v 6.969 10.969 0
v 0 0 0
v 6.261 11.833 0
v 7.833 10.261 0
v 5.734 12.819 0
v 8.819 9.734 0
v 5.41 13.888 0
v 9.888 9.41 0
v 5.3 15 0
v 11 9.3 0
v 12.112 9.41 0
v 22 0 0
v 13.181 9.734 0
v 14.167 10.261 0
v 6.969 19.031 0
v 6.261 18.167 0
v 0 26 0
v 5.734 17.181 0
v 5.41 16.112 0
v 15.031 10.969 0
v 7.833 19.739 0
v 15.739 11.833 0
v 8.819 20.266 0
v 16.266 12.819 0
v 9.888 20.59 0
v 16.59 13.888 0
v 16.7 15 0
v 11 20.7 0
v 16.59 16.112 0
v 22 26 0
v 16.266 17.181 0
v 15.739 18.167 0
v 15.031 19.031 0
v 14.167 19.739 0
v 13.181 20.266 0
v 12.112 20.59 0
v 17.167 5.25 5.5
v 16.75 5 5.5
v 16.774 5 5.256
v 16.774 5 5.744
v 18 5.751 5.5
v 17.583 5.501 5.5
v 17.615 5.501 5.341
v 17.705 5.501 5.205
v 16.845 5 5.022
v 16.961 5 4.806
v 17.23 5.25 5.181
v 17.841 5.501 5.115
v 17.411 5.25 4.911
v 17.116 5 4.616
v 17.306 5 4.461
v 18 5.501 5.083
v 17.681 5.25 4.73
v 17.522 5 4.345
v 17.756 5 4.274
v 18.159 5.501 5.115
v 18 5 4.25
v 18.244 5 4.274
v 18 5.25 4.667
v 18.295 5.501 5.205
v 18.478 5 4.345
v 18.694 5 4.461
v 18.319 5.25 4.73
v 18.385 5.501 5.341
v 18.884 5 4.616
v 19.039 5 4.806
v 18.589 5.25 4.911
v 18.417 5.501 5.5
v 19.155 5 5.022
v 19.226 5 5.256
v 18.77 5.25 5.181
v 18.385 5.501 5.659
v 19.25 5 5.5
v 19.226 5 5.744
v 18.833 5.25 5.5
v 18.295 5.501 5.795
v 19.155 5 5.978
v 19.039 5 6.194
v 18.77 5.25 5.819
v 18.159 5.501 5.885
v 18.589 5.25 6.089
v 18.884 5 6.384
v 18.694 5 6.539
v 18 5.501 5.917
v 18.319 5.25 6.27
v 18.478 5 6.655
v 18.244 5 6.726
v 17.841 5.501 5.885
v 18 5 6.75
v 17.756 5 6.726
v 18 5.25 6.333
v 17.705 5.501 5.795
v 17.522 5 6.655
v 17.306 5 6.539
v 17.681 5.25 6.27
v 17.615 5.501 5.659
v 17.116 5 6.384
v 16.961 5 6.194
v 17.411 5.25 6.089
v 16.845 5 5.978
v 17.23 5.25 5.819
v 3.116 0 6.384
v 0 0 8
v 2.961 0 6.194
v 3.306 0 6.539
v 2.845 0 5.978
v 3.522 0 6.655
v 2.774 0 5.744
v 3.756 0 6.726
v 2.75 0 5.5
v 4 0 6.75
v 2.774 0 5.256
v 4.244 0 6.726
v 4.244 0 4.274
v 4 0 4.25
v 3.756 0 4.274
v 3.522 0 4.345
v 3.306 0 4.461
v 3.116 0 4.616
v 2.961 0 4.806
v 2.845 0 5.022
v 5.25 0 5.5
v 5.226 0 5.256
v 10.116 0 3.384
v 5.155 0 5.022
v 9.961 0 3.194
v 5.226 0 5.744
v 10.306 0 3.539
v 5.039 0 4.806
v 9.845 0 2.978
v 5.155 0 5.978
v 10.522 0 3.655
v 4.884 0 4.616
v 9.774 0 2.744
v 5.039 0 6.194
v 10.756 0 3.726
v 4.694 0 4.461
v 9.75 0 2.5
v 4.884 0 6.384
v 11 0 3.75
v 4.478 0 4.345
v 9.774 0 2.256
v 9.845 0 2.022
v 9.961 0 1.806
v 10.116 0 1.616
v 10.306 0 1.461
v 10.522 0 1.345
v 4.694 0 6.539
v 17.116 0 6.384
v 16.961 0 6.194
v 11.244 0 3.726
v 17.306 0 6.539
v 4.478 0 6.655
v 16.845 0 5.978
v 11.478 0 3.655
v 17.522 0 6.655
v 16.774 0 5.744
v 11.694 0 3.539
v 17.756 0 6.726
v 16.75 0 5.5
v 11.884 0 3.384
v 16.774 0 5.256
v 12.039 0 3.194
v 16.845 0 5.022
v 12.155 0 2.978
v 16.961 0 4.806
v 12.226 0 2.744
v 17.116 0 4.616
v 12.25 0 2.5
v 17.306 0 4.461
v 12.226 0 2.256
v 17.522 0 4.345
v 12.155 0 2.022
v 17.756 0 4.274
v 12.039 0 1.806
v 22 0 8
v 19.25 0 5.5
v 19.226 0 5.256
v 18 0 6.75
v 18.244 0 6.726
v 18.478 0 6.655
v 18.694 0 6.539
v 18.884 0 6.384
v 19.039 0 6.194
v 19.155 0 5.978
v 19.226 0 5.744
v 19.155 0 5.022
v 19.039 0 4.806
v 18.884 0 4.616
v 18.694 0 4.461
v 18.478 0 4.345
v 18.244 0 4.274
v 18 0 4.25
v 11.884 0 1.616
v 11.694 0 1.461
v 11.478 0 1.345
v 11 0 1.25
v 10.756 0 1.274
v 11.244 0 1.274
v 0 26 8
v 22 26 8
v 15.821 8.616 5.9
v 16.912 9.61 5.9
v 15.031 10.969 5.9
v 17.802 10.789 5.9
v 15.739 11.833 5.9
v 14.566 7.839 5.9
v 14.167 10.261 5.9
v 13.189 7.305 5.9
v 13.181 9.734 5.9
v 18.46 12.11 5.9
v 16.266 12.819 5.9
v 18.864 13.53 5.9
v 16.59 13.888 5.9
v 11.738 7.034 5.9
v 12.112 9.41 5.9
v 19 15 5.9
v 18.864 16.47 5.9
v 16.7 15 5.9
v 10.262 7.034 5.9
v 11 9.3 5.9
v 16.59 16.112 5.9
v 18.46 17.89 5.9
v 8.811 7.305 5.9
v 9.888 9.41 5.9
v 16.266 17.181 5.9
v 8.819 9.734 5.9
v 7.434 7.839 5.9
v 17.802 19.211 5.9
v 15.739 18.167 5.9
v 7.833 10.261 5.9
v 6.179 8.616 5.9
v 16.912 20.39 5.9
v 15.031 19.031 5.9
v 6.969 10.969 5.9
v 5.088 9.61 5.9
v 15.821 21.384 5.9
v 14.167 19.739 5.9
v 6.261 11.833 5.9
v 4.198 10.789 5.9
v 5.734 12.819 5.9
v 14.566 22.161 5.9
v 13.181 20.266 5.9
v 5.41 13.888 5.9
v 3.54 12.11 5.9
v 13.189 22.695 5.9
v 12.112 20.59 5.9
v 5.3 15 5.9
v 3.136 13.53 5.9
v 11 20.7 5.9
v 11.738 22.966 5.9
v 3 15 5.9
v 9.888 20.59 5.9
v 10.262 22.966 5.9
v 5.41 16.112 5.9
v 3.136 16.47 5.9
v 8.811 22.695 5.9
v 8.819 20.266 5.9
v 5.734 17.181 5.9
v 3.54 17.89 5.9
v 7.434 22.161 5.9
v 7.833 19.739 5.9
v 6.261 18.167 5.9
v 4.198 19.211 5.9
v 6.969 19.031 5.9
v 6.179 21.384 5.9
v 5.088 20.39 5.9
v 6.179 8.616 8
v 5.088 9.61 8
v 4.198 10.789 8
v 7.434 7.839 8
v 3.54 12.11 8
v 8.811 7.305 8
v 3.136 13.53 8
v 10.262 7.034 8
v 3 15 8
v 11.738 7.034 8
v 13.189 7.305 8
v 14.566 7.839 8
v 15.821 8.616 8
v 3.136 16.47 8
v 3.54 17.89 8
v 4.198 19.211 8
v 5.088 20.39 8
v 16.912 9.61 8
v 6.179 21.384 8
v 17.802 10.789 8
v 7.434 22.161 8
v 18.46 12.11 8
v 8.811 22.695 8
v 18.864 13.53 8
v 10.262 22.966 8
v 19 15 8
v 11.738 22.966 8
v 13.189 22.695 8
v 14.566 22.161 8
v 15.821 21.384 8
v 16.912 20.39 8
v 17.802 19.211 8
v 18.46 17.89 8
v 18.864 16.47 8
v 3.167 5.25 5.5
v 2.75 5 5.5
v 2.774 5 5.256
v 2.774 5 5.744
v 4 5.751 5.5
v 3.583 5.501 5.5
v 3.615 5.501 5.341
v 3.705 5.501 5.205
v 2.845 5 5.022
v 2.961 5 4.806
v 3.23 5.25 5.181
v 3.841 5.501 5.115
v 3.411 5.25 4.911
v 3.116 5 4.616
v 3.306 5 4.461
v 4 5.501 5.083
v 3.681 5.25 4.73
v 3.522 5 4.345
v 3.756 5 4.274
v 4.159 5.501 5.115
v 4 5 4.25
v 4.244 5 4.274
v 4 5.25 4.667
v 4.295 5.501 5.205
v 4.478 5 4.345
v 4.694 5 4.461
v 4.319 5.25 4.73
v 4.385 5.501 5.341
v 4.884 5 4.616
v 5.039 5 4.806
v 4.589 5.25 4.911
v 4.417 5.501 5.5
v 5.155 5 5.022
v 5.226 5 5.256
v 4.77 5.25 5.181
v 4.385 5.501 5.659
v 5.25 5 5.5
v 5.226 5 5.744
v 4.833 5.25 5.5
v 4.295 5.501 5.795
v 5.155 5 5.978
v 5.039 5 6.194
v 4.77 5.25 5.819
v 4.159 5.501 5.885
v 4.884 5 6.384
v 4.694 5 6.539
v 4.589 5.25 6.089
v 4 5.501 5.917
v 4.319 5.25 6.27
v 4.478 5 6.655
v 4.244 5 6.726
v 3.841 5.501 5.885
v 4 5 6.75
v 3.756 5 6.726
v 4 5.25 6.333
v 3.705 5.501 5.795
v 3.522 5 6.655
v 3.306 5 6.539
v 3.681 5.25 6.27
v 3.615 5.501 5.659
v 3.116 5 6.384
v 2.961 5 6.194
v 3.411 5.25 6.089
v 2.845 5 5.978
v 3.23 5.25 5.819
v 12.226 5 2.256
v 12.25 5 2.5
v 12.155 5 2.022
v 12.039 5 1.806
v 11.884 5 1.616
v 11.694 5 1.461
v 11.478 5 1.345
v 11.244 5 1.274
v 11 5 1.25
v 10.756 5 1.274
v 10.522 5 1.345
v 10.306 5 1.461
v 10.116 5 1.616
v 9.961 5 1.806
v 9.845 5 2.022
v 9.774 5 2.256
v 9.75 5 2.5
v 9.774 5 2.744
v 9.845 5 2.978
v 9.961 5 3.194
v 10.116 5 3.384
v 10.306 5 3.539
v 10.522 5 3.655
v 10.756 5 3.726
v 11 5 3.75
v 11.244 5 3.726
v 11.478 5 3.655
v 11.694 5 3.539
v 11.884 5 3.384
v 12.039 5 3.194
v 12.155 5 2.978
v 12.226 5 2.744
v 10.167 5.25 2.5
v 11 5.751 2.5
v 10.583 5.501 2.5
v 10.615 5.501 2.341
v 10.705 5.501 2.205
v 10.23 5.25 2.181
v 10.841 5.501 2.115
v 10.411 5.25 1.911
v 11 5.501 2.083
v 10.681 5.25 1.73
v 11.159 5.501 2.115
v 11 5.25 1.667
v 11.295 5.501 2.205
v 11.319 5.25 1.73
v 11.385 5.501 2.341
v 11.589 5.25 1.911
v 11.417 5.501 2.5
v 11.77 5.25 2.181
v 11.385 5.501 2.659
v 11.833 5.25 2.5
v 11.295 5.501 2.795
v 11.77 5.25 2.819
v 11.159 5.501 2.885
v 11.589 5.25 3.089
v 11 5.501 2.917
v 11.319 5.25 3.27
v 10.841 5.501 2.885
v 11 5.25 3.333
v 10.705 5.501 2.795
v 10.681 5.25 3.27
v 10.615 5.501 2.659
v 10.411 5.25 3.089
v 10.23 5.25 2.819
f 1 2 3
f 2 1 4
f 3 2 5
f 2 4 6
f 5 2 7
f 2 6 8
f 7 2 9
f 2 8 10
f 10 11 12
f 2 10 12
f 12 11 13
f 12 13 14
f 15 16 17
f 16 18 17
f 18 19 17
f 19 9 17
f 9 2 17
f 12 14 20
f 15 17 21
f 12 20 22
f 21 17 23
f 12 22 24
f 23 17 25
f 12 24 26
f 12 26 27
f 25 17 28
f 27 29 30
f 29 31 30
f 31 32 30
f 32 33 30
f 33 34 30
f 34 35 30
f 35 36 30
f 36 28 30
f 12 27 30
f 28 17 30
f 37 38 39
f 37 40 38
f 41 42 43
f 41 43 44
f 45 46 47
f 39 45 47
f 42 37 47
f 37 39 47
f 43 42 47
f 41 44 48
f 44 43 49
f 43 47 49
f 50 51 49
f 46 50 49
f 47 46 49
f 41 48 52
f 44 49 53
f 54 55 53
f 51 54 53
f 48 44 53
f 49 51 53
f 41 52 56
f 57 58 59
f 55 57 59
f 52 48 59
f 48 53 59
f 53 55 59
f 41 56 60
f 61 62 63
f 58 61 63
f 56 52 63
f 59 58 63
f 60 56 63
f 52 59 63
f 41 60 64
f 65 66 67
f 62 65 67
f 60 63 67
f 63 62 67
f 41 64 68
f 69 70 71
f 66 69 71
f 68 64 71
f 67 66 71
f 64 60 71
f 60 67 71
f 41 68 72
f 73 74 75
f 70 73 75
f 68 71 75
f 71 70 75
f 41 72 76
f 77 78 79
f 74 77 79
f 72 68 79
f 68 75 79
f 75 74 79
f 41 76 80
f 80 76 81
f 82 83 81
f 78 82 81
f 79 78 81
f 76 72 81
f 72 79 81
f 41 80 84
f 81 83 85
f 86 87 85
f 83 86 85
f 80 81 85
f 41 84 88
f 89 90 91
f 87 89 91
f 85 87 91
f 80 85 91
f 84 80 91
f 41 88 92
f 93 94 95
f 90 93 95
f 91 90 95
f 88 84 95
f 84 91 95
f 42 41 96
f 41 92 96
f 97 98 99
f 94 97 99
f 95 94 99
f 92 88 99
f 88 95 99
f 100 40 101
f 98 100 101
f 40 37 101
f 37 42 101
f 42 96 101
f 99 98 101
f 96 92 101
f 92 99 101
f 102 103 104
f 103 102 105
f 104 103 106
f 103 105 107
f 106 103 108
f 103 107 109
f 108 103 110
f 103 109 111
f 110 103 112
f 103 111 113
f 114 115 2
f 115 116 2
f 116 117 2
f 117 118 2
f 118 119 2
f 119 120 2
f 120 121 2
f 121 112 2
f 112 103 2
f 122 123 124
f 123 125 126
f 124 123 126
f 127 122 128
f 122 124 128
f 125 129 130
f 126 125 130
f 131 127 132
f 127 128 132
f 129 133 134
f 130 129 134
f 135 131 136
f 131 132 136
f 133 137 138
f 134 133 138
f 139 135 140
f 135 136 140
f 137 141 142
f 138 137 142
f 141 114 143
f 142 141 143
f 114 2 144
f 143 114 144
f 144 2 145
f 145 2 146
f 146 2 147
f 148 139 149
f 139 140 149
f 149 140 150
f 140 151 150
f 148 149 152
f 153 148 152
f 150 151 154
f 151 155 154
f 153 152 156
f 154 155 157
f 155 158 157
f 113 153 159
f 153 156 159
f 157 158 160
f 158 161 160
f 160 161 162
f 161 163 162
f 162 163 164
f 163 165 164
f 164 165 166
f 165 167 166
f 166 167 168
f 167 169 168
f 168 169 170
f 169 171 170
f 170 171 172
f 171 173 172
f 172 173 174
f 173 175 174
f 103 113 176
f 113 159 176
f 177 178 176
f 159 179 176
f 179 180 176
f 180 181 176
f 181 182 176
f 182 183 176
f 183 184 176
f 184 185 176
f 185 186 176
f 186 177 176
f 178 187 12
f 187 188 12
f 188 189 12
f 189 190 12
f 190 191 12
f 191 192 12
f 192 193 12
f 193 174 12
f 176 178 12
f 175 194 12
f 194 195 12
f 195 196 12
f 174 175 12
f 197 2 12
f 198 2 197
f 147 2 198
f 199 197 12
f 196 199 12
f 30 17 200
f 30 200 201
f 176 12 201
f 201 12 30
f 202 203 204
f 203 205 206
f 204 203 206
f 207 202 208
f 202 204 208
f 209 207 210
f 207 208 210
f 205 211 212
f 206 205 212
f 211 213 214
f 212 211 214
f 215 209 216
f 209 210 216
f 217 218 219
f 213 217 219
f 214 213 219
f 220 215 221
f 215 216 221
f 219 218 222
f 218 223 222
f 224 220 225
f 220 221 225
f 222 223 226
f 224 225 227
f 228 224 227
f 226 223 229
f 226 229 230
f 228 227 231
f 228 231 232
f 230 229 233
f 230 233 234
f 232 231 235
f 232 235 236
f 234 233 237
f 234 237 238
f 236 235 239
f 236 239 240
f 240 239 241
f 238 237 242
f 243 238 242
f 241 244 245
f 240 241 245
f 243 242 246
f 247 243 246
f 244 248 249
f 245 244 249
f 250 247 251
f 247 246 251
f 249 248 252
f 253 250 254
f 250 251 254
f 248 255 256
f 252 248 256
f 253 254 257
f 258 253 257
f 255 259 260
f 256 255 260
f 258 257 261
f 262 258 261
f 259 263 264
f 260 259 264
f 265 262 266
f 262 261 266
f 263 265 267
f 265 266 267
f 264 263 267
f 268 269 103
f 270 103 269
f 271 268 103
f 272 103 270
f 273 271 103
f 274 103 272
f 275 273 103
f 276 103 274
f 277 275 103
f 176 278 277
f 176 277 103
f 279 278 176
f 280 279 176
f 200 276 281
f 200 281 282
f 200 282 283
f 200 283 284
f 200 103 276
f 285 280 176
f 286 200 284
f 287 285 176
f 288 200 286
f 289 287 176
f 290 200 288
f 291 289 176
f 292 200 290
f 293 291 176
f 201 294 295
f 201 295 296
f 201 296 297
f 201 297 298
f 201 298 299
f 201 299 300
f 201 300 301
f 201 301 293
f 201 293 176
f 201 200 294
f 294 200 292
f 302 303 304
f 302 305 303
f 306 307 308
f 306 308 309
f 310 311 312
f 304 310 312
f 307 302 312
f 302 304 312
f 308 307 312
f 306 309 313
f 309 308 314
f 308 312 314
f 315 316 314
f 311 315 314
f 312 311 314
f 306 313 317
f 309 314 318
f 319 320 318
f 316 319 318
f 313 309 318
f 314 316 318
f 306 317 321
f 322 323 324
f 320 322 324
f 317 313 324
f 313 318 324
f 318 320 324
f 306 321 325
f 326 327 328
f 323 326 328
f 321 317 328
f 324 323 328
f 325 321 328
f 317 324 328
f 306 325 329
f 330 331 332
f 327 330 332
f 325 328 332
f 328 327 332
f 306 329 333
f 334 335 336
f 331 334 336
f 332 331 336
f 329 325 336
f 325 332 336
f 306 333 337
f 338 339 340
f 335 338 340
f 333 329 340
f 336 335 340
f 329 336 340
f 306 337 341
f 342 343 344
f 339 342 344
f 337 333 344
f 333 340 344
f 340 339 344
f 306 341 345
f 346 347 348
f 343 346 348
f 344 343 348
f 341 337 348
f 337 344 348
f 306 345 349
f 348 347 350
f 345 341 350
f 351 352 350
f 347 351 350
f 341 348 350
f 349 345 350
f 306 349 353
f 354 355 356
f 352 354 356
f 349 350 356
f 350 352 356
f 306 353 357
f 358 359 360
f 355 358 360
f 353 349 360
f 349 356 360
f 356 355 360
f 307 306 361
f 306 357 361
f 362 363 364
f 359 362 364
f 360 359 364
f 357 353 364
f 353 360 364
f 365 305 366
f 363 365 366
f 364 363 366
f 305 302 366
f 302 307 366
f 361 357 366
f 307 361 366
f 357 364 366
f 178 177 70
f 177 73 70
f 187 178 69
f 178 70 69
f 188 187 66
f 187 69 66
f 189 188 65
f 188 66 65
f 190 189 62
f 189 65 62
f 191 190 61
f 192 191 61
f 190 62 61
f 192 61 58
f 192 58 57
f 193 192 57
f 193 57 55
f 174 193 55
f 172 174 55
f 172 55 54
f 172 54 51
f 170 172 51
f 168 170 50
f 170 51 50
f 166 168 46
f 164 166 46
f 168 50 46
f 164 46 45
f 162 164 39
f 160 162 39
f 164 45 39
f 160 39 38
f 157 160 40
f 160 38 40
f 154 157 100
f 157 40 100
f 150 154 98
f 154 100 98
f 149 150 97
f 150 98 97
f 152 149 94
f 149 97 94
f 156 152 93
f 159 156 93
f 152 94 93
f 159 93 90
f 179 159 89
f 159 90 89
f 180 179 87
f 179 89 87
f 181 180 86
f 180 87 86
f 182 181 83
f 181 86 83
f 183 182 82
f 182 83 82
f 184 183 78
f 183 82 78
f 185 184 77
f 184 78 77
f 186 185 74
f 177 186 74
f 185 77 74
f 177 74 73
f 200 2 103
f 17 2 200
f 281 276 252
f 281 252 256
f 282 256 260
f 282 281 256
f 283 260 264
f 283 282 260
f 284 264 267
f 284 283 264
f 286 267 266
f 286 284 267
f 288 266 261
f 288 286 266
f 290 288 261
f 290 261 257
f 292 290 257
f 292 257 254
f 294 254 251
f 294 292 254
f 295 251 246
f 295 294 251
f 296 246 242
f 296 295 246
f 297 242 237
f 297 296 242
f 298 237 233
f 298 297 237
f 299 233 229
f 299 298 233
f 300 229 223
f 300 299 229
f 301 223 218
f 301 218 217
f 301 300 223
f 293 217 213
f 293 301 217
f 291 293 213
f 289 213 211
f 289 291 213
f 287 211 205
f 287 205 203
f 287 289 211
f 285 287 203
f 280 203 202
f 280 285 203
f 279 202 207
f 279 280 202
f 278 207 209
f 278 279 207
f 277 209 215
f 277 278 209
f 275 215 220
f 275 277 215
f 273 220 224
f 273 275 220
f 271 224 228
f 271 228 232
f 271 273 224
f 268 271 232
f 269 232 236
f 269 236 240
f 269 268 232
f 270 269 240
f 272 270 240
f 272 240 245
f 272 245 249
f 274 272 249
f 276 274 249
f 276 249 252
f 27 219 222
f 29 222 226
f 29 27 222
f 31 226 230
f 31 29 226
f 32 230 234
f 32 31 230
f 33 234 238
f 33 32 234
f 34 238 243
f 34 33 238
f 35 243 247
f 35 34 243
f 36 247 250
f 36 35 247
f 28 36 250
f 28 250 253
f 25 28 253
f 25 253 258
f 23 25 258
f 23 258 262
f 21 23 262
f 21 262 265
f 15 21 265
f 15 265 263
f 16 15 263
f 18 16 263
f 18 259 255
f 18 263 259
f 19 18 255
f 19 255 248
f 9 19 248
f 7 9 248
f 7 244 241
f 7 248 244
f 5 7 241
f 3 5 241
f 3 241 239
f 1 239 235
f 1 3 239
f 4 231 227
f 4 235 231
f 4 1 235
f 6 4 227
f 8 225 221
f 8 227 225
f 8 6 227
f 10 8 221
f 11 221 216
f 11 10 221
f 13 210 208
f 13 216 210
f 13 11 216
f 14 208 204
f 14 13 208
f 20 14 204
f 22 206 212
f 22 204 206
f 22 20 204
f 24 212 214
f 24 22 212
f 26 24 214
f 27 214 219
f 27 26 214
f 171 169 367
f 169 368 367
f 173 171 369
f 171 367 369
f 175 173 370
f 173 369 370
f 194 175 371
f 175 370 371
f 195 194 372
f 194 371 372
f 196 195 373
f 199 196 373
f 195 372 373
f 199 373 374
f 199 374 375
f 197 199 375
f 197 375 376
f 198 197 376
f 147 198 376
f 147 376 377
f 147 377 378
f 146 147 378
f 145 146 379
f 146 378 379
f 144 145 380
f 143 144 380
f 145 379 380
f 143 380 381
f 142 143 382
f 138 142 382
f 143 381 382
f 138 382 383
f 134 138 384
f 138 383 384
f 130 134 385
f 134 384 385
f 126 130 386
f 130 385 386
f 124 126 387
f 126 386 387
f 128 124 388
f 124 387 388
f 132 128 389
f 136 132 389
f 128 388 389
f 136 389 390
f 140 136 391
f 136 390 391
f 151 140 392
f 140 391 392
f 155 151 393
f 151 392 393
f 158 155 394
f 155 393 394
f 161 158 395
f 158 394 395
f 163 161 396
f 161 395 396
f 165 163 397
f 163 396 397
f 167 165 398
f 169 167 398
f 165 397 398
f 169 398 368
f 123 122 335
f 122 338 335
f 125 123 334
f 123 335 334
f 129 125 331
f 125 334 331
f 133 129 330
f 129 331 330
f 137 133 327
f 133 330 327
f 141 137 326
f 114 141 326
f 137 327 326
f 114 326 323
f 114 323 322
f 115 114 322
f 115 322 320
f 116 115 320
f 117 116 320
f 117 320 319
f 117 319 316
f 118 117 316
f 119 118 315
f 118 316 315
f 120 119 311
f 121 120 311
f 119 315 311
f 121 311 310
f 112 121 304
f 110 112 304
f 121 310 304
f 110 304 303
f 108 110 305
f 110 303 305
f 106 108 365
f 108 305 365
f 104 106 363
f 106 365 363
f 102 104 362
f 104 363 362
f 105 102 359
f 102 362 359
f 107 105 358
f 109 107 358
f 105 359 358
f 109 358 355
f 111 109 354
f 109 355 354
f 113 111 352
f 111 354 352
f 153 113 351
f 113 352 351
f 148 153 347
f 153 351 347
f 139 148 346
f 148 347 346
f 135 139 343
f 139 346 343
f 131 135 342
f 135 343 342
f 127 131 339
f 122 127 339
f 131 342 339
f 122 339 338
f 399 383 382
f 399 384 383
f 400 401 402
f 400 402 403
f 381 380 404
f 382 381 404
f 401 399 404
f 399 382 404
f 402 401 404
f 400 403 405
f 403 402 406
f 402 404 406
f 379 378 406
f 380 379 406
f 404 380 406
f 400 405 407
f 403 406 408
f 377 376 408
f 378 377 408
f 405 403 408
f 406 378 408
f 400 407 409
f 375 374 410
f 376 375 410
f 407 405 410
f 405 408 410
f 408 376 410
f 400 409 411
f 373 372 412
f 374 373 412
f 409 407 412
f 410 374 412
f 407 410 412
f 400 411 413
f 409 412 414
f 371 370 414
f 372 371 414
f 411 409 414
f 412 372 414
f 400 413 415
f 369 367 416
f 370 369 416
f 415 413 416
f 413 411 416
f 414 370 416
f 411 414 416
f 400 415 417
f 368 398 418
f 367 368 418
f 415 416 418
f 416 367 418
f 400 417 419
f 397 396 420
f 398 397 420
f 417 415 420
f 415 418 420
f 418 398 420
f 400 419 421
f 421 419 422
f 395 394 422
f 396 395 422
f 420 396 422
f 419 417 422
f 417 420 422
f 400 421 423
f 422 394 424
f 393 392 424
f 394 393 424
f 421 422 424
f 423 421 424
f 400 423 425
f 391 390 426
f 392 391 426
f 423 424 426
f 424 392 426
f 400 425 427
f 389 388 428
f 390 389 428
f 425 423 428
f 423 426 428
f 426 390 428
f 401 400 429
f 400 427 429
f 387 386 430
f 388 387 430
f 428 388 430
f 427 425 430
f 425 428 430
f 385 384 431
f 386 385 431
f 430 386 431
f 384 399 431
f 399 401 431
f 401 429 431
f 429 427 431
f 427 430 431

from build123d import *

# Parameters (mm, degrees)
SKETCH1_W                       = 22
SKETCH1_H                       = 26
SKETCH1_R                       = 5.7
BOSS_EXTRUDE1_DEPTH             = 8
SKETCH3_R                       = 8
CUT_EXTRUDE2_DEPTH              = 2.1
TAP_DRILL_FOR_M3X0_5_TAP1_D     = 2.5
TAP_DRILL_FOR_M3X0_5_TAP1_DEPTH = 5
TAP_DRILL_FOR_M3X0_5_TAP1_TIP   = 0.751075774


with BuildPart() as part:
    # Sketch1 → Boss-Extrude1 (new body)
    with BuildSketch(Plane.XY):
        with Locations((11, 13)):
            Rectangle(SKETCH1_W, SKETCH1_H)
        with Locations((11, 15)):
            Circle(SKETCH1_R, mode=Mode.SUBTRACT)
    extrude(amount=BOSS_EXTRUDE1_DEPTH)

    # Sketch3 → Cut-Extrude2 (cut)
    with BuildSketch(Plane(origin=(0, 0, 8), x_dir=(-1, 0, 0), z_dir=(0, 0, -1))):
        with Locations((-11, 15)):
            Circle(SKETCH3_R)
    extrude(amount=CUT_EXTRUDE2_DEPTH, mode=Mode.SUBTRACT)

    # Tap Drill for M3x0.5 Tap1
    with Locations(Plane(origin=(0, 0, 0), x_dir=(-1, 0, 0), z_dir=(0, -1, 0))):
        with Locations((-4, -5.5), (-18, -5.5), (-11, -2.5)):
            Hole(TAP_DRILL_FOR_M3X0_5_TAP1_D / 2, depth=TAP_DRILL_FOR_M3X0_5_TAP1_DEPTH)
            with Locations((0, 0, -(TAP_DRILL_FOR_M3X0_5_TAP1_DEPTH + TAP_DRILL_FOR_M3X0_5_TAP1_TIP / 2))):  # 118° drill point
                Cone(0, TAP_DRILL_FOR_M3X0_5_TAP1_D / 2, TAP_DRILL_FOR_M3X0_5_TAP1_TIP, mode=Mode.SUBTRACT)


solid = part.part
